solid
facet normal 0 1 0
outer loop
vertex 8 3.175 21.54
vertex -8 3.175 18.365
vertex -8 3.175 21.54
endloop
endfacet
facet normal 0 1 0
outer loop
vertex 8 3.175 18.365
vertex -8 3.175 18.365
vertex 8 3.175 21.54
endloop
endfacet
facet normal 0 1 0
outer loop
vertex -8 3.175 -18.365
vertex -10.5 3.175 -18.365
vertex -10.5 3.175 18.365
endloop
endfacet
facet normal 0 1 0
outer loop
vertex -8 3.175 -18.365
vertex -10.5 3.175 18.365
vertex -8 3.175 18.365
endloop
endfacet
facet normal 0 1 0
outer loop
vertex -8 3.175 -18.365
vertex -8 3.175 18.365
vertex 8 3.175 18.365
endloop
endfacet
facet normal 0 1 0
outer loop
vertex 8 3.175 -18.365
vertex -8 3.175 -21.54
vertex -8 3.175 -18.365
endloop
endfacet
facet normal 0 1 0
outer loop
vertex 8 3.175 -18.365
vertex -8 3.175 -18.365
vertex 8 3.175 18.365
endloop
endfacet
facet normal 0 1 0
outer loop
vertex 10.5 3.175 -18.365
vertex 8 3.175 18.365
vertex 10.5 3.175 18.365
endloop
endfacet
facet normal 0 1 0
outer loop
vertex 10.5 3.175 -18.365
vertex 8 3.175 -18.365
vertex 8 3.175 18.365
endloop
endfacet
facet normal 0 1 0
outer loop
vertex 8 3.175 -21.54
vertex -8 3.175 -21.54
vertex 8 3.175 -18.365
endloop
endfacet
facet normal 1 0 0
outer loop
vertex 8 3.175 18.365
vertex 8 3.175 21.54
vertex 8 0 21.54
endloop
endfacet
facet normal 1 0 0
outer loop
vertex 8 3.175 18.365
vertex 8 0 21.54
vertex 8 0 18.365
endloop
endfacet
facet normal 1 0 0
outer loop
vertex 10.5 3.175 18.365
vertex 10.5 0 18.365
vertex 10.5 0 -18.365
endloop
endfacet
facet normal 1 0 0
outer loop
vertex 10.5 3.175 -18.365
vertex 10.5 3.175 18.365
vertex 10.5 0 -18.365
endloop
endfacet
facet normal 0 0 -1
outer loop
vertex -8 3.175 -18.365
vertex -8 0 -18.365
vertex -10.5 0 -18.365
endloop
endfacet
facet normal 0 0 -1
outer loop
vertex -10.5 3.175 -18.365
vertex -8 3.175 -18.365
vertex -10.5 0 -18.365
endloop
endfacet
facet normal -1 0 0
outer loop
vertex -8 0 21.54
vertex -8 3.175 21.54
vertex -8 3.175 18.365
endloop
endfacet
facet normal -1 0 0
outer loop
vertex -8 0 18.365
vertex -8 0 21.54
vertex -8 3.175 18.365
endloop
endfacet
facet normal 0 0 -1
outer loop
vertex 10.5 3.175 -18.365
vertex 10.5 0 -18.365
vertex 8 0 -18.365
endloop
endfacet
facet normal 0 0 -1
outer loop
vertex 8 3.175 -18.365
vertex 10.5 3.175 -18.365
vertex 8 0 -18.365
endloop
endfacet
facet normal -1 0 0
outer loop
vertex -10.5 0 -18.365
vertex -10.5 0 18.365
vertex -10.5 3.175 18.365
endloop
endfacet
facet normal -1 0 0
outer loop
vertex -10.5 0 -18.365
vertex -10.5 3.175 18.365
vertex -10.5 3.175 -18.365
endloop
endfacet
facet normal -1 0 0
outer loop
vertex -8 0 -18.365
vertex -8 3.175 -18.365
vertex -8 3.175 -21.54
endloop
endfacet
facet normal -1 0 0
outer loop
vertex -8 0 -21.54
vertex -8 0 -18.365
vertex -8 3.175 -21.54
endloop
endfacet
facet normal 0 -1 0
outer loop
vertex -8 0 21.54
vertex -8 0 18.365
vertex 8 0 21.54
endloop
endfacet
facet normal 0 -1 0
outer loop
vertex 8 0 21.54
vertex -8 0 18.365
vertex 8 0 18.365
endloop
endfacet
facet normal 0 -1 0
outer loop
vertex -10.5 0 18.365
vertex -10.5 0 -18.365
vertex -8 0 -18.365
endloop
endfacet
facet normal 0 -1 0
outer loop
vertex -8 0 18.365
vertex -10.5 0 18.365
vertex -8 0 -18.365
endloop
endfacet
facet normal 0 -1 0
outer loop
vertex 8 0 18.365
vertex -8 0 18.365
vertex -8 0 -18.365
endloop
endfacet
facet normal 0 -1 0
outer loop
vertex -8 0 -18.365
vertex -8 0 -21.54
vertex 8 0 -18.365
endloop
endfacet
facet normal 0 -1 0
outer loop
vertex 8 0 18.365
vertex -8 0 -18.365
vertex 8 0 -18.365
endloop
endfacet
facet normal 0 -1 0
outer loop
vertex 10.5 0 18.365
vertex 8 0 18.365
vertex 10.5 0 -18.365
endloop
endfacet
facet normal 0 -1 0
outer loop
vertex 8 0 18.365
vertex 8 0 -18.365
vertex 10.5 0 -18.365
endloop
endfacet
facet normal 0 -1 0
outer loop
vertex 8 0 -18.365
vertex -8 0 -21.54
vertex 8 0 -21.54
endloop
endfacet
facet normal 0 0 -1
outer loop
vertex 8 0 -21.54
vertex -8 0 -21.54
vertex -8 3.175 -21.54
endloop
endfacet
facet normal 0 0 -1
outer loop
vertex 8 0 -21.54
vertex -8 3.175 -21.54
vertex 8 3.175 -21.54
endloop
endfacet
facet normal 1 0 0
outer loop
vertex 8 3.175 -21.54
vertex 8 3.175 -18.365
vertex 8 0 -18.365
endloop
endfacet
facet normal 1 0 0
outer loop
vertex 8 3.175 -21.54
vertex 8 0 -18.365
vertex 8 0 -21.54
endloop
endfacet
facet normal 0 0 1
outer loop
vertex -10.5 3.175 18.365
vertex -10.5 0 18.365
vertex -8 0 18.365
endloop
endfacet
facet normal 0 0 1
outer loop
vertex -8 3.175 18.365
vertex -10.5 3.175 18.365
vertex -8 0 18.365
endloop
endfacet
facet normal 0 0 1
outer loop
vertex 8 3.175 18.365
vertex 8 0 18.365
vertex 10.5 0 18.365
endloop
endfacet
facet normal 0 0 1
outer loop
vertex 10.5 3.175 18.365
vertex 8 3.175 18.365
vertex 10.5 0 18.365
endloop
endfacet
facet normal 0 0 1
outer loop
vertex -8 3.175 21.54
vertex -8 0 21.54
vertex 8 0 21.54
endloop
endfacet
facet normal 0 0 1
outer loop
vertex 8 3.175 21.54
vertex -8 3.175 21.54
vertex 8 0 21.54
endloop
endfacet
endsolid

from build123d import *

# Parameters (mm, degrees)
SKETCH1_W           = 2.5
SKETCH1_H           = 36.73
SKETCH1_W_2         = 16
SKETCH1_H_2         = 3.175
BOSS_EXTRUDE1_DEPTH = 3.175


with BuildPart() as part:
    # Sketch1 → Boss-Extrude1 (new body)
    with BuildSketch(Plane(origin=(0, 0, 0), x_dir=(1, 0, 0), z_dir=(0, 1, 0))):
        with Locations((-9.25, 0)):
            Rectangle(SKETCH1_W, SKETCH1_H)
        Rectangle(SKETCH1_W_2, SKETCH1_H)
        with Locations((9.25, 0)):
            Rectangle(SKETCH1_W, SKETCH1_H)
        with Locations((0, -19.9525)):
            Rectangle(SKETCH1_W_2, SKETCH1_H_2)
        with Locations((0, 19.9525)):
            Rectangle(SKETCH1_W_2, SKETCH1_H_2)
    extrude(amount=BOSS_EXTRUDE1_DEPTH)


solid = part.part
